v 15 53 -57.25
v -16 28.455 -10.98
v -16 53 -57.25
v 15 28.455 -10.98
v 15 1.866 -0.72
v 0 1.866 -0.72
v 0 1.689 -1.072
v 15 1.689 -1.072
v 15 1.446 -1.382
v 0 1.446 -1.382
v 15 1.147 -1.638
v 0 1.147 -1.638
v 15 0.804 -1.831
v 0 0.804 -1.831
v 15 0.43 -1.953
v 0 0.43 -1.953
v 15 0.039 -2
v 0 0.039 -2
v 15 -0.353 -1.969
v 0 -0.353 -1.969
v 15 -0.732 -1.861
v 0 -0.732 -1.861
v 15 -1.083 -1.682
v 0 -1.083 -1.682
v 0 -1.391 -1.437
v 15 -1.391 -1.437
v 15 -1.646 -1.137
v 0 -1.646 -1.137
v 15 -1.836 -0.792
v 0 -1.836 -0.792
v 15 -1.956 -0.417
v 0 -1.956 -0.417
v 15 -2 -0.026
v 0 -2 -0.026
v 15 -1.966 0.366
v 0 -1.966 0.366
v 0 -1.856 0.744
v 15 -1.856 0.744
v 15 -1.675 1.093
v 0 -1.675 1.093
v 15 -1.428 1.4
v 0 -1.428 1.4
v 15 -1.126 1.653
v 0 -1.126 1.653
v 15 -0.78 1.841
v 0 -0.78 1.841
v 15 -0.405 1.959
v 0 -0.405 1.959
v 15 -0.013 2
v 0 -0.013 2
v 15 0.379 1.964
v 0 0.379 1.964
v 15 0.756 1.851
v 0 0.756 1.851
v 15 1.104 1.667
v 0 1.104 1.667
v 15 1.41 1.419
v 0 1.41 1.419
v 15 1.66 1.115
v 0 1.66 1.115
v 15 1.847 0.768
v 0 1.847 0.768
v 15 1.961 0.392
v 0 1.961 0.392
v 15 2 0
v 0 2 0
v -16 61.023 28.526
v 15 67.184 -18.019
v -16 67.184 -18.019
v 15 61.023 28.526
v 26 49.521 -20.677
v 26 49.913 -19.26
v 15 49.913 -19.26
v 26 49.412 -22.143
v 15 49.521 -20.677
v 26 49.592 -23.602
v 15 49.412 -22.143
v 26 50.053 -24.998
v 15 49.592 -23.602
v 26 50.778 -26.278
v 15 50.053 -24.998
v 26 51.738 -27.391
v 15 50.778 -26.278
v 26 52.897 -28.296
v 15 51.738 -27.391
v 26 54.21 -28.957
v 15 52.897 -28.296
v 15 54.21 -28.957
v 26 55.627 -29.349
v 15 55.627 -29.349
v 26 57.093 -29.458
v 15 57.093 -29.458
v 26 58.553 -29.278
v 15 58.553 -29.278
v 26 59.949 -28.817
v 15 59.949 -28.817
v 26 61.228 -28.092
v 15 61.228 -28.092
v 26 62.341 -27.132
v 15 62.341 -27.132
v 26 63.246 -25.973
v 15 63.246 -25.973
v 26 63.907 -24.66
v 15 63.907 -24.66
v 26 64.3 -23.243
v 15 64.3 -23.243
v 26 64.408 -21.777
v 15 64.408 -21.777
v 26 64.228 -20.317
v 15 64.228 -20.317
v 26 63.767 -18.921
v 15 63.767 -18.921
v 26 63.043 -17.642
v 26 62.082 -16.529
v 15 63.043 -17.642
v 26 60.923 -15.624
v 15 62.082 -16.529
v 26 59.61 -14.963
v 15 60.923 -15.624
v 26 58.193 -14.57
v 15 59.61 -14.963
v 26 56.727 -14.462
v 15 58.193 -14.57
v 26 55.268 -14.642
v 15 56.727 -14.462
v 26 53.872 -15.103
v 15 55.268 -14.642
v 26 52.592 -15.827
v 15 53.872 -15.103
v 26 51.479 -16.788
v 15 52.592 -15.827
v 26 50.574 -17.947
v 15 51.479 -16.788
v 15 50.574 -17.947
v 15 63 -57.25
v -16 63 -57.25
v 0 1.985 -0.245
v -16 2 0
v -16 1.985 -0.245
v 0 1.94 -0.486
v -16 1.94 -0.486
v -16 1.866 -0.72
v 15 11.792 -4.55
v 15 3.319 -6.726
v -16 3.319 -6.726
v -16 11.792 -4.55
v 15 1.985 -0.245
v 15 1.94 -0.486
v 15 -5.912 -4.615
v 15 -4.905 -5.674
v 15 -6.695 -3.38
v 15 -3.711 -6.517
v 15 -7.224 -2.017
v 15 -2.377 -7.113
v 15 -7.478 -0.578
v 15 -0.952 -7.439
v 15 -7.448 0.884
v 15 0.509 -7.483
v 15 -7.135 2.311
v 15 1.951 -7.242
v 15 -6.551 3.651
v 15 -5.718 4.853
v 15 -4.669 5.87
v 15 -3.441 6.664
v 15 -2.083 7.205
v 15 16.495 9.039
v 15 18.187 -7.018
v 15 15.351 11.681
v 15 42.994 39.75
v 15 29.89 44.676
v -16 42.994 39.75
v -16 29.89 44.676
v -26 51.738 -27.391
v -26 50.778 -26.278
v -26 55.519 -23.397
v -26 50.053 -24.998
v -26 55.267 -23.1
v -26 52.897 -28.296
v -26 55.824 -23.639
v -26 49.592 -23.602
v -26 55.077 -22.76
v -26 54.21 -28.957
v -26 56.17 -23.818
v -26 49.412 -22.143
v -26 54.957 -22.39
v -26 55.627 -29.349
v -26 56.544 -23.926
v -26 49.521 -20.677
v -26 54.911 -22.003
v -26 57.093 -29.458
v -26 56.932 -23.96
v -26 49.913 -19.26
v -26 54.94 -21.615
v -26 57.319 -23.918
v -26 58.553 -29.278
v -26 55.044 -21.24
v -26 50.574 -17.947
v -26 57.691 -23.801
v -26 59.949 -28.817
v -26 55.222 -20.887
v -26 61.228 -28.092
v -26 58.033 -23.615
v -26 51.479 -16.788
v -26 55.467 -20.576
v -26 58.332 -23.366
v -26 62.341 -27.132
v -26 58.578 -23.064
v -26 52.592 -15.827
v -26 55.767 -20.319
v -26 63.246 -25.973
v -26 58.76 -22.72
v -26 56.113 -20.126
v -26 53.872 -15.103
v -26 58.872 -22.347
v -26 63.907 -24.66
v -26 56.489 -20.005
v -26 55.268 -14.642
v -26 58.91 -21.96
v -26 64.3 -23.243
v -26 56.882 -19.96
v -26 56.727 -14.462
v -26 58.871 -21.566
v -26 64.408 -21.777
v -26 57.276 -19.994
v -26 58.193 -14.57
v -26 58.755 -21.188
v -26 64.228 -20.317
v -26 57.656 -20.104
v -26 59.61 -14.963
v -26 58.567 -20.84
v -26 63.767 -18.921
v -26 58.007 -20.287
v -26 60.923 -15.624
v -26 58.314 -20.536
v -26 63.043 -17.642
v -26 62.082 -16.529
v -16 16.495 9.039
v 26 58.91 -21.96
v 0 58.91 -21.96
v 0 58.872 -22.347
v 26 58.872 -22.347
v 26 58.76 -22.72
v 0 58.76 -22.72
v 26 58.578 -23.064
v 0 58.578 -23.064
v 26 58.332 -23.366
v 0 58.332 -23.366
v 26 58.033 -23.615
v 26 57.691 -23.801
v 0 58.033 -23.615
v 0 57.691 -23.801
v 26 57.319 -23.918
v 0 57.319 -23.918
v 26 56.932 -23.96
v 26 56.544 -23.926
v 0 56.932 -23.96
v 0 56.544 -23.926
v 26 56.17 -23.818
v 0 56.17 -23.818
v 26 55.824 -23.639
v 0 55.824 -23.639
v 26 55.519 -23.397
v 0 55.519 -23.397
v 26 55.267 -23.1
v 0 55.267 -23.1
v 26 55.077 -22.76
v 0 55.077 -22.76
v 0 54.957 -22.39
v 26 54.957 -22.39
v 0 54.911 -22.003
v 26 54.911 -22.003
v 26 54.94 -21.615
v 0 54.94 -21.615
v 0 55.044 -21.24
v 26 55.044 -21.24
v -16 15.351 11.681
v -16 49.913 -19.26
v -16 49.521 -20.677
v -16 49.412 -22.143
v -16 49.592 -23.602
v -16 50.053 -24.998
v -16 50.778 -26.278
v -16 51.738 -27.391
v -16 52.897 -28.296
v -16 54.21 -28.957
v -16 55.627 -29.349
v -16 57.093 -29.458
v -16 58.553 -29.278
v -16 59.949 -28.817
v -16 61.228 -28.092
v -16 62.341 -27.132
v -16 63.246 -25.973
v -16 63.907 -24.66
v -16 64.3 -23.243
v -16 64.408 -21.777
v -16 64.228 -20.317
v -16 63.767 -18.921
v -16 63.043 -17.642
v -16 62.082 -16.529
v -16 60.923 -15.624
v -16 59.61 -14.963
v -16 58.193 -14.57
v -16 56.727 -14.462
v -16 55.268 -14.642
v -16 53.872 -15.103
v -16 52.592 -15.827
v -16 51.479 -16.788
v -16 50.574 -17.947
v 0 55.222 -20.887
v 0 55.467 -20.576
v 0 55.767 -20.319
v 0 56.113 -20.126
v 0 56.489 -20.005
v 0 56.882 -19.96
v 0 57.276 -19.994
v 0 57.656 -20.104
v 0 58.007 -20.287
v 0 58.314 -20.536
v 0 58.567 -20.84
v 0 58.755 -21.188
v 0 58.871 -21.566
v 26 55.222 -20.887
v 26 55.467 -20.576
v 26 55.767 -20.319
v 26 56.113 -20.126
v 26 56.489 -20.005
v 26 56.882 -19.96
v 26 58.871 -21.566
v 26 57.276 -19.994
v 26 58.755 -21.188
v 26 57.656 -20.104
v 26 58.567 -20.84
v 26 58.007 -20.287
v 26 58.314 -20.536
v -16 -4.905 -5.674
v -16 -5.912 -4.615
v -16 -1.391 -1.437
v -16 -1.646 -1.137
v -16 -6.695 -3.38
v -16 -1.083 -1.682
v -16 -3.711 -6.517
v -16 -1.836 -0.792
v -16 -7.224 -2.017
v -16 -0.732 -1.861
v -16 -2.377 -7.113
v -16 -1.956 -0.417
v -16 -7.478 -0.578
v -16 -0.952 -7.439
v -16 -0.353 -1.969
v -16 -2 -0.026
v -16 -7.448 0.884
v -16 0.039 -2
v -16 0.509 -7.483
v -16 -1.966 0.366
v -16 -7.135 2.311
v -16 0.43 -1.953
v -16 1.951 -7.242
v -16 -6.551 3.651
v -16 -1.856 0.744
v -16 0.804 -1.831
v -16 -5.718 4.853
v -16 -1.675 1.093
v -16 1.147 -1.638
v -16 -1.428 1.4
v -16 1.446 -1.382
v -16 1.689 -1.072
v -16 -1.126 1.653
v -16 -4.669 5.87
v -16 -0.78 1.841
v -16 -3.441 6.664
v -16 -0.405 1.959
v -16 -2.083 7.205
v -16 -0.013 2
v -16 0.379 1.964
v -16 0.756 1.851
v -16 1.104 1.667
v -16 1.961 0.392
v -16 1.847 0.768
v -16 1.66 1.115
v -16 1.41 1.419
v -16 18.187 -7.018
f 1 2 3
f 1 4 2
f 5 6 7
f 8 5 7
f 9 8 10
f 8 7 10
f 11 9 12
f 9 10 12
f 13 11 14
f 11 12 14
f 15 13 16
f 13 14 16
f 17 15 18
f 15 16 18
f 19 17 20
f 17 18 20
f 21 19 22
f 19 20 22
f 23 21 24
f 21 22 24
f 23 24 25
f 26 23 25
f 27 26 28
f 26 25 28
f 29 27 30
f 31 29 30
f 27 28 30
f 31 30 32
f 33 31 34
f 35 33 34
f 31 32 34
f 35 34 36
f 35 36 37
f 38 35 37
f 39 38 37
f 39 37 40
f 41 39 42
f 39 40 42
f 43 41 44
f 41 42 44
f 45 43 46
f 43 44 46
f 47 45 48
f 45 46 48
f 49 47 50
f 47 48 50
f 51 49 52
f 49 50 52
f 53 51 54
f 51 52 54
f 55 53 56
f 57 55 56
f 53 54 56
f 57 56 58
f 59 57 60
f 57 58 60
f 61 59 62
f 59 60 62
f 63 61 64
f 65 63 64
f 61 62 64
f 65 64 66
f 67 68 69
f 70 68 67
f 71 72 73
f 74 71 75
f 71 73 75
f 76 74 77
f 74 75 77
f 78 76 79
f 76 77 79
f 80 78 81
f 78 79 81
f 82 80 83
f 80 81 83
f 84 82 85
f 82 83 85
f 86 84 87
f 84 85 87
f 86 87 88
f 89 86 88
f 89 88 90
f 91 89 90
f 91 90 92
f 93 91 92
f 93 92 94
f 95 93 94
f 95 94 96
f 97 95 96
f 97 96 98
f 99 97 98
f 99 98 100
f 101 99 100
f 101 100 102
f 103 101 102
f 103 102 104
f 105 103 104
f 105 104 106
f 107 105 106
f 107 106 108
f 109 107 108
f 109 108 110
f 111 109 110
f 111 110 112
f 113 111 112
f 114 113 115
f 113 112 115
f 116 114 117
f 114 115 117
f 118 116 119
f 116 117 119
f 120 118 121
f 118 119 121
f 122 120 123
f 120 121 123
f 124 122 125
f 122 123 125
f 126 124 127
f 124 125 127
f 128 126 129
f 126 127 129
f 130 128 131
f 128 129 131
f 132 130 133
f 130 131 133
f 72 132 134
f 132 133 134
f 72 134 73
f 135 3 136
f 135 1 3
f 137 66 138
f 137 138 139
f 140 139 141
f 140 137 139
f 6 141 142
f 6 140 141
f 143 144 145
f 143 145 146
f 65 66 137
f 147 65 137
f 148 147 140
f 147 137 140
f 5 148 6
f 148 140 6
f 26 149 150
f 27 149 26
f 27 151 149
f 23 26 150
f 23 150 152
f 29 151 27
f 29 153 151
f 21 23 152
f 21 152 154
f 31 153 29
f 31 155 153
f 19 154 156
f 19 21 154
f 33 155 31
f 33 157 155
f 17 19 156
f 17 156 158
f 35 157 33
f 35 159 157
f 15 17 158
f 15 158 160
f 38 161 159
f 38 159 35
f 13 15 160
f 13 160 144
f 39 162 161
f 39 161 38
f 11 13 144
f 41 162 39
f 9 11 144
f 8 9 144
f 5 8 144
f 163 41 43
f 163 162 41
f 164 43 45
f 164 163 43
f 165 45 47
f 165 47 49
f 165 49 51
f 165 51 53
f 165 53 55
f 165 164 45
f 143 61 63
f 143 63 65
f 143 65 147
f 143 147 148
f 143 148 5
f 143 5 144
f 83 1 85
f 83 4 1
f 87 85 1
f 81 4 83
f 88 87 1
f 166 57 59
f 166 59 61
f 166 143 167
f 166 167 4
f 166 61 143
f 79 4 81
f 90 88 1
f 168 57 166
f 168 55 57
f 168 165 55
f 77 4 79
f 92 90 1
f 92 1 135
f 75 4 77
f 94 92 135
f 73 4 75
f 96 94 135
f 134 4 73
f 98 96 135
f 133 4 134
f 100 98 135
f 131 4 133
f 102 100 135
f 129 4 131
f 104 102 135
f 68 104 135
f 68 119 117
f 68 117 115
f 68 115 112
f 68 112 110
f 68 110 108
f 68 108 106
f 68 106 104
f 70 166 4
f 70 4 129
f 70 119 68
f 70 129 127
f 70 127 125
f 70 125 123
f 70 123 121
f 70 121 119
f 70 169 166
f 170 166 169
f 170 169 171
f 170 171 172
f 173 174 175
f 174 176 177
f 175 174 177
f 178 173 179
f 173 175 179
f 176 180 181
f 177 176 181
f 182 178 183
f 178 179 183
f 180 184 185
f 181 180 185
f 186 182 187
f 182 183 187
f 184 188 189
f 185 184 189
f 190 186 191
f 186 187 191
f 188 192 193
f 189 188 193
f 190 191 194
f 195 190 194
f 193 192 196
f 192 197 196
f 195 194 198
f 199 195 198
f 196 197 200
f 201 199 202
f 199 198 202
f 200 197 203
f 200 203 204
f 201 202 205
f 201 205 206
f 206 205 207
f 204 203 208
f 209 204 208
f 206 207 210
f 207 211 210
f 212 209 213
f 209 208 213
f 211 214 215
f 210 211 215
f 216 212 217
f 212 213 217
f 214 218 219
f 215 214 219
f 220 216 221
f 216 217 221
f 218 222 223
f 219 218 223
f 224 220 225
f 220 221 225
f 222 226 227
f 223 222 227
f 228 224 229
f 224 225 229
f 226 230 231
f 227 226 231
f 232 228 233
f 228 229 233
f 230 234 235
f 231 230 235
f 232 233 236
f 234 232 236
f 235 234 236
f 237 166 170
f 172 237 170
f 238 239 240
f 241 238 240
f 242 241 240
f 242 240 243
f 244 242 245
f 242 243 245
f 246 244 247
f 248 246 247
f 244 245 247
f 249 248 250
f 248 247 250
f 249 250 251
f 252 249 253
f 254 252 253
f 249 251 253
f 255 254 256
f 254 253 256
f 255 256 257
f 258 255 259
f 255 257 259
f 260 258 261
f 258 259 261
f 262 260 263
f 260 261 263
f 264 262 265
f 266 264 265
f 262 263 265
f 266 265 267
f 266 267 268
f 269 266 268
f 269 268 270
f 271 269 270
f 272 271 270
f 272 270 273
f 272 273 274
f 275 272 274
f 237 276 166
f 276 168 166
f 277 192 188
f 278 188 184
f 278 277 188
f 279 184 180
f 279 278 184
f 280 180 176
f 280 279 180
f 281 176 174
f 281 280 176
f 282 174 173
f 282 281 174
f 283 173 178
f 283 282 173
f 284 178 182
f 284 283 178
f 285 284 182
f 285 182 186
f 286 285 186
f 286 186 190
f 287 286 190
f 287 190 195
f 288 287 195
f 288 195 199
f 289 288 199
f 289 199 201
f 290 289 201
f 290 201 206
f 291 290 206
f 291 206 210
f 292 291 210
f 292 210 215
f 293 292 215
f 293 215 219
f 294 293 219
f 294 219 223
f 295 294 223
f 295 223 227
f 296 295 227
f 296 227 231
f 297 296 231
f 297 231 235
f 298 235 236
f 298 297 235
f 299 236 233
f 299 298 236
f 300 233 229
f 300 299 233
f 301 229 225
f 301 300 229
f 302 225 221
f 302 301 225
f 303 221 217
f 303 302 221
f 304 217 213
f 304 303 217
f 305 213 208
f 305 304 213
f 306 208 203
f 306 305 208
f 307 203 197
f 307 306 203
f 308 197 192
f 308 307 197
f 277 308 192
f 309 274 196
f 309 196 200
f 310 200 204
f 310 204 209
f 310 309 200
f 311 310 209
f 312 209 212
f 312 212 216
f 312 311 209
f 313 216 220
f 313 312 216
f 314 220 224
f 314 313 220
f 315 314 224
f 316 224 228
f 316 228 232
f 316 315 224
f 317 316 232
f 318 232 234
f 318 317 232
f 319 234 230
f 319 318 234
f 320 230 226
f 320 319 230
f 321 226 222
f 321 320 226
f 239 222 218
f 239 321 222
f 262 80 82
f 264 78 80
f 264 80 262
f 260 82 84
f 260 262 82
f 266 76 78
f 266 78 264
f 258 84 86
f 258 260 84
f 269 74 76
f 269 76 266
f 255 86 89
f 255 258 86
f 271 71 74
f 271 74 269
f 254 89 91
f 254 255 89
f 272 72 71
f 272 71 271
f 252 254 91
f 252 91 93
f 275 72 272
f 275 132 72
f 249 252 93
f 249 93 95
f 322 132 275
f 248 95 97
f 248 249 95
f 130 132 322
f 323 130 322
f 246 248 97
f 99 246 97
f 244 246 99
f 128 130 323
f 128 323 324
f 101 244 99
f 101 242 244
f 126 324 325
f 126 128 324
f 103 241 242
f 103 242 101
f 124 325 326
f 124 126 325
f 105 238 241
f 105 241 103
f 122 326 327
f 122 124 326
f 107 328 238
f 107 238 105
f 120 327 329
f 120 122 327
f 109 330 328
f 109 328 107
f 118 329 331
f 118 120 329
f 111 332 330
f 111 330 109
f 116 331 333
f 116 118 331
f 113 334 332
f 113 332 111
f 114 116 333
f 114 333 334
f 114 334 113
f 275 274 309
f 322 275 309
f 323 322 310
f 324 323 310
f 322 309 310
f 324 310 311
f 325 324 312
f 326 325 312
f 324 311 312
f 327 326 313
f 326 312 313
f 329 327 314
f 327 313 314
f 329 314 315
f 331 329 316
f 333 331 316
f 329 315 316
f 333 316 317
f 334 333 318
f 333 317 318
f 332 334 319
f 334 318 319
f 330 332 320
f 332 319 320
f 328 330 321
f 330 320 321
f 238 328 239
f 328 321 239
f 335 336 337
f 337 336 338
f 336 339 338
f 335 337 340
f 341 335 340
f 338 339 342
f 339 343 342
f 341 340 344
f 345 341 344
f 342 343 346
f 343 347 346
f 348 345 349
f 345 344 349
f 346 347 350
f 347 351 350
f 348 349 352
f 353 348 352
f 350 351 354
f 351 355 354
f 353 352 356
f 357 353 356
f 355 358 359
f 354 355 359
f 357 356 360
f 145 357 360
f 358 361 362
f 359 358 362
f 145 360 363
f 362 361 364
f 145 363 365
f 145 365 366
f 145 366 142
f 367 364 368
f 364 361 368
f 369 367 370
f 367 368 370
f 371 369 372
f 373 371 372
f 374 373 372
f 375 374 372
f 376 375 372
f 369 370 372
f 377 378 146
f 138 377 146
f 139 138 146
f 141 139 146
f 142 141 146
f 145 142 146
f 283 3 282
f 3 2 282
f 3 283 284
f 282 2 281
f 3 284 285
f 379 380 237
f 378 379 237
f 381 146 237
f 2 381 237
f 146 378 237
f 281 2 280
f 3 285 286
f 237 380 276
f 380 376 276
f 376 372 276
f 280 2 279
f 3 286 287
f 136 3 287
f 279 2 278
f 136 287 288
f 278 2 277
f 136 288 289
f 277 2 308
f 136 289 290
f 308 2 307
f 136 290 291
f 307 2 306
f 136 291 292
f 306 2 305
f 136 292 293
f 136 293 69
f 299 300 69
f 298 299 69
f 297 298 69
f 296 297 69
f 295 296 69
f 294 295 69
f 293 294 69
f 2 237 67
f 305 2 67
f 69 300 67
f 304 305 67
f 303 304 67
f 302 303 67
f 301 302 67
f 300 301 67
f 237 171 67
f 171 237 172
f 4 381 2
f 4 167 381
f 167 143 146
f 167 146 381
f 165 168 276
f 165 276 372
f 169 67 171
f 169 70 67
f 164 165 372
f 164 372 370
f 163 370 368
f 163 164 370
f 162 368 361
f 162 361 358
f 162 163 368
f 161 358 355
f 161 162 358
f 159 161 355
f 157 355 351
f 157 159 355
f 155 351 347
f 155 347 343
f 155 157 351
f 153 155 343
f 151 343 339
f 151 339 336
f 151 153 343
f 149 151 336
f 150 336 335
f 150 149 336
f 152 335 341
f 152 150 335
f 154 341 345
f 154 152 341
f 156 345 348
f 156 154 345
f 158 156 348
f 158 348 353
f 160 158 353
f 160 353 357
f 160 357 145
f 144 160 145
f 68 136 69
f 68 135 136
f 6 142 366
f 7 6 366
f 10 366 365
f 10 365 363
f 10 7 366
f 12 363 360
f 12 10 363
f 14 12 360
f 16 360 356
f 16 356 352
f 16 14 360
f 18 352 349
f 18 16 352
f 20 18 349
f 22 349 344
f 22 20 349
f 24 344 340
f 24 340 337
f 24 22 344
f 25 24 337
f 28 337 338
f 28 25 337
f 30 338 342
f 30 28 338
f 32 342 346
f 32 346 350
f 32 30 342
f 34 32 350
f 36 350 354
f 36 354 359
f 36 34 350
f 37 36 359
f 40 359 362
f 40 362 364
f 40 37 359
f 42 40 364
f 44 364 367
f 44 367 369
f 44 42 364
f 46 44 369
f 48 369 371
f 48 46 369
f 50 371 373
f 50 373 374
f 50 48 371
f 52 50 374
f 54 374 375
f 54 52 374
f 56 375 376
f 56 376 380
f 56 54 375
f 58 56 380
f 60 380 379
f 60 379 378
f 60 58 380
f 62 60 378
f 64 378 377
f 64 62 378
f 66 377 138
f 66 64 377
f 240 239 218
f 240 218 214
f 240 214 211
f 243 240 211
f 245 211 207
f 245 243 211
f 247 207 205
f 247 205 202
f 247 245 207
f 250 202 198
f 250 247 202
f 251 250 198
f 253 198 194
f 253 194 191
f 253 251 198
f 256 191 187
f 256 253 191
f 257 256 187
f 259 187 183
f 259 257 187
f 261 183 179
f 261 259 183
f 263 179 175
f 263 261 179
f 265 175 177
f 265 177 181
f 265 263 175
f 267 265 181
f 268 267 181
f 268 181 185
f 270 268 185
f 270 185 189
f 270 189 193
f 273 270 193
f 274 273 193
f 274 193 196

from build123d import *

# Parameters (mm, degrees)
F3_DEPTH      = 15
F3_DEPTH_BACK = 16
F4_DEPTH      = 26
F4_DEPTH_BACK = 26
F6_DEPTH      = 25
F6_DEPTH_BACK = 25


# Not quite as in the source:
# - a feature names something its author has since deleted; it is built from what else it names


with BuildPart() as f3:
    # F0 (on Right) → F3 (new body, two sides)
    with BuildSketch(Plane.YZ) as f3_sk:
        Polygon((42.99440903, 39.7499332097), (24.4999610724, -9.4537481835), (28.4550828122, -10.9799026477), (53, -57.2503693402), (63, -57.2503693402), (67.1839944136, -18.0194567546), (61.0229901087, 28.5260152414), align=None)
        with BuildLine():
            ThreePointArc((64.4101656244, -21.9598052953), (55.5369643161, -29.3330215655), (49.9130141132, -19.2598292344))
            ThreePointArc((49.9130141132, -19.2598292344), (58.2833669326, -14.5865890251), (64.4101656244, -21.9598052953))
        make_face(mode=Mode.SUBTRACT)
        with BuildLine():
            Line((3.3187451802, -6.7257661592), (11.7920777761, -4.5501841217))
            Line((11.7920777761, -4.5501841217), (18.186862473, -7.0177261735))
            Line((18.186862473, -7.0177261735), (24.4999610724, -9.4537481835))
            Line((24.4999610724, -9.4537481835), (42.99440903, 39.7499332097))
            Line((42.99440903, 39.7499332097), (28.0174564582, 45.3793995842))
            Line((28.0174564582, 45.3793995842), (15.3511571156, 11.6812562976))
            Line((15.3511571156, 11.6812562976), (-2.0833397847, 7.2048383286))
            ThreePointArc((-2.0833397847, 7.2048383286), (-6.9926384128, -2.7116430495), (3.3187451802, -6.7257661592))
        make_face()
        with BuildLine():
            ThreePointArc((2, 0), (1.9661910054, -0.3661870155), (1.8659070697, -0.7199936162))
            ThreePointArc((1.8659070697, -0.7199936162), (-1.9661910054, 0.3661870155), (2, 0))
        make_face(mode=Mode.SUBTRACT)
    extrude(amount=F3_DEPTH)
    extrude(f3_sk.sketch, amount=-F3_DEPTH_BACK)

    # F0 (on Right) → F4 (join, two sides)
    with BuildSketch(Plane.YZ) as f4_sk:
        with BuildLine():
            ThreePointArc((64.4101656244, -21.9598052953), (58.2833669326, -14.5865890251), (49.9130141132, -19.2598292344))
            ThreePointArc((49.9130141132, -19.2598292344), (55.5369643161, -29.3330215655), (64.4101656244, -21.9598052953))
        make_face()
        with BuildLine():
            ThreePointArc((58.9101656244, -21.9598052953), (56.5439786088, -23.9259963007), (55.0442585547, -21.2398116791))
            ThreePointArc((55.0442585547, -21.2398116791), (57.2763526399, -19.9936142899), (58.9101656244, -21.9598052953))
        make_face(mode=Mode.SUBTRACT)
    extrude(amount=F4_DEPTH)
    extrude(f4_sk.sketch, amount=-F4_DEPTH_BACK)

    # F5 (on Right) → F6 (cut, two sides)
    with BuildSketch(Plane.YZ) as f6_sk:
        Polygon((16.4947576102, 9.0393807374), (29.8895755297, 44.6757162874), (28.0174564582, 45.3793995842), (15.3511571156, 11.6812562976), align=None)
    extrude(amount=-F6_DEPTH, mode=Mode.SUBTRACT)
    extrude(f6_sk.sketch, amount=F6_DEPTH_BACK, mode=Mode.SUBTRACT)


solid = f3.part
